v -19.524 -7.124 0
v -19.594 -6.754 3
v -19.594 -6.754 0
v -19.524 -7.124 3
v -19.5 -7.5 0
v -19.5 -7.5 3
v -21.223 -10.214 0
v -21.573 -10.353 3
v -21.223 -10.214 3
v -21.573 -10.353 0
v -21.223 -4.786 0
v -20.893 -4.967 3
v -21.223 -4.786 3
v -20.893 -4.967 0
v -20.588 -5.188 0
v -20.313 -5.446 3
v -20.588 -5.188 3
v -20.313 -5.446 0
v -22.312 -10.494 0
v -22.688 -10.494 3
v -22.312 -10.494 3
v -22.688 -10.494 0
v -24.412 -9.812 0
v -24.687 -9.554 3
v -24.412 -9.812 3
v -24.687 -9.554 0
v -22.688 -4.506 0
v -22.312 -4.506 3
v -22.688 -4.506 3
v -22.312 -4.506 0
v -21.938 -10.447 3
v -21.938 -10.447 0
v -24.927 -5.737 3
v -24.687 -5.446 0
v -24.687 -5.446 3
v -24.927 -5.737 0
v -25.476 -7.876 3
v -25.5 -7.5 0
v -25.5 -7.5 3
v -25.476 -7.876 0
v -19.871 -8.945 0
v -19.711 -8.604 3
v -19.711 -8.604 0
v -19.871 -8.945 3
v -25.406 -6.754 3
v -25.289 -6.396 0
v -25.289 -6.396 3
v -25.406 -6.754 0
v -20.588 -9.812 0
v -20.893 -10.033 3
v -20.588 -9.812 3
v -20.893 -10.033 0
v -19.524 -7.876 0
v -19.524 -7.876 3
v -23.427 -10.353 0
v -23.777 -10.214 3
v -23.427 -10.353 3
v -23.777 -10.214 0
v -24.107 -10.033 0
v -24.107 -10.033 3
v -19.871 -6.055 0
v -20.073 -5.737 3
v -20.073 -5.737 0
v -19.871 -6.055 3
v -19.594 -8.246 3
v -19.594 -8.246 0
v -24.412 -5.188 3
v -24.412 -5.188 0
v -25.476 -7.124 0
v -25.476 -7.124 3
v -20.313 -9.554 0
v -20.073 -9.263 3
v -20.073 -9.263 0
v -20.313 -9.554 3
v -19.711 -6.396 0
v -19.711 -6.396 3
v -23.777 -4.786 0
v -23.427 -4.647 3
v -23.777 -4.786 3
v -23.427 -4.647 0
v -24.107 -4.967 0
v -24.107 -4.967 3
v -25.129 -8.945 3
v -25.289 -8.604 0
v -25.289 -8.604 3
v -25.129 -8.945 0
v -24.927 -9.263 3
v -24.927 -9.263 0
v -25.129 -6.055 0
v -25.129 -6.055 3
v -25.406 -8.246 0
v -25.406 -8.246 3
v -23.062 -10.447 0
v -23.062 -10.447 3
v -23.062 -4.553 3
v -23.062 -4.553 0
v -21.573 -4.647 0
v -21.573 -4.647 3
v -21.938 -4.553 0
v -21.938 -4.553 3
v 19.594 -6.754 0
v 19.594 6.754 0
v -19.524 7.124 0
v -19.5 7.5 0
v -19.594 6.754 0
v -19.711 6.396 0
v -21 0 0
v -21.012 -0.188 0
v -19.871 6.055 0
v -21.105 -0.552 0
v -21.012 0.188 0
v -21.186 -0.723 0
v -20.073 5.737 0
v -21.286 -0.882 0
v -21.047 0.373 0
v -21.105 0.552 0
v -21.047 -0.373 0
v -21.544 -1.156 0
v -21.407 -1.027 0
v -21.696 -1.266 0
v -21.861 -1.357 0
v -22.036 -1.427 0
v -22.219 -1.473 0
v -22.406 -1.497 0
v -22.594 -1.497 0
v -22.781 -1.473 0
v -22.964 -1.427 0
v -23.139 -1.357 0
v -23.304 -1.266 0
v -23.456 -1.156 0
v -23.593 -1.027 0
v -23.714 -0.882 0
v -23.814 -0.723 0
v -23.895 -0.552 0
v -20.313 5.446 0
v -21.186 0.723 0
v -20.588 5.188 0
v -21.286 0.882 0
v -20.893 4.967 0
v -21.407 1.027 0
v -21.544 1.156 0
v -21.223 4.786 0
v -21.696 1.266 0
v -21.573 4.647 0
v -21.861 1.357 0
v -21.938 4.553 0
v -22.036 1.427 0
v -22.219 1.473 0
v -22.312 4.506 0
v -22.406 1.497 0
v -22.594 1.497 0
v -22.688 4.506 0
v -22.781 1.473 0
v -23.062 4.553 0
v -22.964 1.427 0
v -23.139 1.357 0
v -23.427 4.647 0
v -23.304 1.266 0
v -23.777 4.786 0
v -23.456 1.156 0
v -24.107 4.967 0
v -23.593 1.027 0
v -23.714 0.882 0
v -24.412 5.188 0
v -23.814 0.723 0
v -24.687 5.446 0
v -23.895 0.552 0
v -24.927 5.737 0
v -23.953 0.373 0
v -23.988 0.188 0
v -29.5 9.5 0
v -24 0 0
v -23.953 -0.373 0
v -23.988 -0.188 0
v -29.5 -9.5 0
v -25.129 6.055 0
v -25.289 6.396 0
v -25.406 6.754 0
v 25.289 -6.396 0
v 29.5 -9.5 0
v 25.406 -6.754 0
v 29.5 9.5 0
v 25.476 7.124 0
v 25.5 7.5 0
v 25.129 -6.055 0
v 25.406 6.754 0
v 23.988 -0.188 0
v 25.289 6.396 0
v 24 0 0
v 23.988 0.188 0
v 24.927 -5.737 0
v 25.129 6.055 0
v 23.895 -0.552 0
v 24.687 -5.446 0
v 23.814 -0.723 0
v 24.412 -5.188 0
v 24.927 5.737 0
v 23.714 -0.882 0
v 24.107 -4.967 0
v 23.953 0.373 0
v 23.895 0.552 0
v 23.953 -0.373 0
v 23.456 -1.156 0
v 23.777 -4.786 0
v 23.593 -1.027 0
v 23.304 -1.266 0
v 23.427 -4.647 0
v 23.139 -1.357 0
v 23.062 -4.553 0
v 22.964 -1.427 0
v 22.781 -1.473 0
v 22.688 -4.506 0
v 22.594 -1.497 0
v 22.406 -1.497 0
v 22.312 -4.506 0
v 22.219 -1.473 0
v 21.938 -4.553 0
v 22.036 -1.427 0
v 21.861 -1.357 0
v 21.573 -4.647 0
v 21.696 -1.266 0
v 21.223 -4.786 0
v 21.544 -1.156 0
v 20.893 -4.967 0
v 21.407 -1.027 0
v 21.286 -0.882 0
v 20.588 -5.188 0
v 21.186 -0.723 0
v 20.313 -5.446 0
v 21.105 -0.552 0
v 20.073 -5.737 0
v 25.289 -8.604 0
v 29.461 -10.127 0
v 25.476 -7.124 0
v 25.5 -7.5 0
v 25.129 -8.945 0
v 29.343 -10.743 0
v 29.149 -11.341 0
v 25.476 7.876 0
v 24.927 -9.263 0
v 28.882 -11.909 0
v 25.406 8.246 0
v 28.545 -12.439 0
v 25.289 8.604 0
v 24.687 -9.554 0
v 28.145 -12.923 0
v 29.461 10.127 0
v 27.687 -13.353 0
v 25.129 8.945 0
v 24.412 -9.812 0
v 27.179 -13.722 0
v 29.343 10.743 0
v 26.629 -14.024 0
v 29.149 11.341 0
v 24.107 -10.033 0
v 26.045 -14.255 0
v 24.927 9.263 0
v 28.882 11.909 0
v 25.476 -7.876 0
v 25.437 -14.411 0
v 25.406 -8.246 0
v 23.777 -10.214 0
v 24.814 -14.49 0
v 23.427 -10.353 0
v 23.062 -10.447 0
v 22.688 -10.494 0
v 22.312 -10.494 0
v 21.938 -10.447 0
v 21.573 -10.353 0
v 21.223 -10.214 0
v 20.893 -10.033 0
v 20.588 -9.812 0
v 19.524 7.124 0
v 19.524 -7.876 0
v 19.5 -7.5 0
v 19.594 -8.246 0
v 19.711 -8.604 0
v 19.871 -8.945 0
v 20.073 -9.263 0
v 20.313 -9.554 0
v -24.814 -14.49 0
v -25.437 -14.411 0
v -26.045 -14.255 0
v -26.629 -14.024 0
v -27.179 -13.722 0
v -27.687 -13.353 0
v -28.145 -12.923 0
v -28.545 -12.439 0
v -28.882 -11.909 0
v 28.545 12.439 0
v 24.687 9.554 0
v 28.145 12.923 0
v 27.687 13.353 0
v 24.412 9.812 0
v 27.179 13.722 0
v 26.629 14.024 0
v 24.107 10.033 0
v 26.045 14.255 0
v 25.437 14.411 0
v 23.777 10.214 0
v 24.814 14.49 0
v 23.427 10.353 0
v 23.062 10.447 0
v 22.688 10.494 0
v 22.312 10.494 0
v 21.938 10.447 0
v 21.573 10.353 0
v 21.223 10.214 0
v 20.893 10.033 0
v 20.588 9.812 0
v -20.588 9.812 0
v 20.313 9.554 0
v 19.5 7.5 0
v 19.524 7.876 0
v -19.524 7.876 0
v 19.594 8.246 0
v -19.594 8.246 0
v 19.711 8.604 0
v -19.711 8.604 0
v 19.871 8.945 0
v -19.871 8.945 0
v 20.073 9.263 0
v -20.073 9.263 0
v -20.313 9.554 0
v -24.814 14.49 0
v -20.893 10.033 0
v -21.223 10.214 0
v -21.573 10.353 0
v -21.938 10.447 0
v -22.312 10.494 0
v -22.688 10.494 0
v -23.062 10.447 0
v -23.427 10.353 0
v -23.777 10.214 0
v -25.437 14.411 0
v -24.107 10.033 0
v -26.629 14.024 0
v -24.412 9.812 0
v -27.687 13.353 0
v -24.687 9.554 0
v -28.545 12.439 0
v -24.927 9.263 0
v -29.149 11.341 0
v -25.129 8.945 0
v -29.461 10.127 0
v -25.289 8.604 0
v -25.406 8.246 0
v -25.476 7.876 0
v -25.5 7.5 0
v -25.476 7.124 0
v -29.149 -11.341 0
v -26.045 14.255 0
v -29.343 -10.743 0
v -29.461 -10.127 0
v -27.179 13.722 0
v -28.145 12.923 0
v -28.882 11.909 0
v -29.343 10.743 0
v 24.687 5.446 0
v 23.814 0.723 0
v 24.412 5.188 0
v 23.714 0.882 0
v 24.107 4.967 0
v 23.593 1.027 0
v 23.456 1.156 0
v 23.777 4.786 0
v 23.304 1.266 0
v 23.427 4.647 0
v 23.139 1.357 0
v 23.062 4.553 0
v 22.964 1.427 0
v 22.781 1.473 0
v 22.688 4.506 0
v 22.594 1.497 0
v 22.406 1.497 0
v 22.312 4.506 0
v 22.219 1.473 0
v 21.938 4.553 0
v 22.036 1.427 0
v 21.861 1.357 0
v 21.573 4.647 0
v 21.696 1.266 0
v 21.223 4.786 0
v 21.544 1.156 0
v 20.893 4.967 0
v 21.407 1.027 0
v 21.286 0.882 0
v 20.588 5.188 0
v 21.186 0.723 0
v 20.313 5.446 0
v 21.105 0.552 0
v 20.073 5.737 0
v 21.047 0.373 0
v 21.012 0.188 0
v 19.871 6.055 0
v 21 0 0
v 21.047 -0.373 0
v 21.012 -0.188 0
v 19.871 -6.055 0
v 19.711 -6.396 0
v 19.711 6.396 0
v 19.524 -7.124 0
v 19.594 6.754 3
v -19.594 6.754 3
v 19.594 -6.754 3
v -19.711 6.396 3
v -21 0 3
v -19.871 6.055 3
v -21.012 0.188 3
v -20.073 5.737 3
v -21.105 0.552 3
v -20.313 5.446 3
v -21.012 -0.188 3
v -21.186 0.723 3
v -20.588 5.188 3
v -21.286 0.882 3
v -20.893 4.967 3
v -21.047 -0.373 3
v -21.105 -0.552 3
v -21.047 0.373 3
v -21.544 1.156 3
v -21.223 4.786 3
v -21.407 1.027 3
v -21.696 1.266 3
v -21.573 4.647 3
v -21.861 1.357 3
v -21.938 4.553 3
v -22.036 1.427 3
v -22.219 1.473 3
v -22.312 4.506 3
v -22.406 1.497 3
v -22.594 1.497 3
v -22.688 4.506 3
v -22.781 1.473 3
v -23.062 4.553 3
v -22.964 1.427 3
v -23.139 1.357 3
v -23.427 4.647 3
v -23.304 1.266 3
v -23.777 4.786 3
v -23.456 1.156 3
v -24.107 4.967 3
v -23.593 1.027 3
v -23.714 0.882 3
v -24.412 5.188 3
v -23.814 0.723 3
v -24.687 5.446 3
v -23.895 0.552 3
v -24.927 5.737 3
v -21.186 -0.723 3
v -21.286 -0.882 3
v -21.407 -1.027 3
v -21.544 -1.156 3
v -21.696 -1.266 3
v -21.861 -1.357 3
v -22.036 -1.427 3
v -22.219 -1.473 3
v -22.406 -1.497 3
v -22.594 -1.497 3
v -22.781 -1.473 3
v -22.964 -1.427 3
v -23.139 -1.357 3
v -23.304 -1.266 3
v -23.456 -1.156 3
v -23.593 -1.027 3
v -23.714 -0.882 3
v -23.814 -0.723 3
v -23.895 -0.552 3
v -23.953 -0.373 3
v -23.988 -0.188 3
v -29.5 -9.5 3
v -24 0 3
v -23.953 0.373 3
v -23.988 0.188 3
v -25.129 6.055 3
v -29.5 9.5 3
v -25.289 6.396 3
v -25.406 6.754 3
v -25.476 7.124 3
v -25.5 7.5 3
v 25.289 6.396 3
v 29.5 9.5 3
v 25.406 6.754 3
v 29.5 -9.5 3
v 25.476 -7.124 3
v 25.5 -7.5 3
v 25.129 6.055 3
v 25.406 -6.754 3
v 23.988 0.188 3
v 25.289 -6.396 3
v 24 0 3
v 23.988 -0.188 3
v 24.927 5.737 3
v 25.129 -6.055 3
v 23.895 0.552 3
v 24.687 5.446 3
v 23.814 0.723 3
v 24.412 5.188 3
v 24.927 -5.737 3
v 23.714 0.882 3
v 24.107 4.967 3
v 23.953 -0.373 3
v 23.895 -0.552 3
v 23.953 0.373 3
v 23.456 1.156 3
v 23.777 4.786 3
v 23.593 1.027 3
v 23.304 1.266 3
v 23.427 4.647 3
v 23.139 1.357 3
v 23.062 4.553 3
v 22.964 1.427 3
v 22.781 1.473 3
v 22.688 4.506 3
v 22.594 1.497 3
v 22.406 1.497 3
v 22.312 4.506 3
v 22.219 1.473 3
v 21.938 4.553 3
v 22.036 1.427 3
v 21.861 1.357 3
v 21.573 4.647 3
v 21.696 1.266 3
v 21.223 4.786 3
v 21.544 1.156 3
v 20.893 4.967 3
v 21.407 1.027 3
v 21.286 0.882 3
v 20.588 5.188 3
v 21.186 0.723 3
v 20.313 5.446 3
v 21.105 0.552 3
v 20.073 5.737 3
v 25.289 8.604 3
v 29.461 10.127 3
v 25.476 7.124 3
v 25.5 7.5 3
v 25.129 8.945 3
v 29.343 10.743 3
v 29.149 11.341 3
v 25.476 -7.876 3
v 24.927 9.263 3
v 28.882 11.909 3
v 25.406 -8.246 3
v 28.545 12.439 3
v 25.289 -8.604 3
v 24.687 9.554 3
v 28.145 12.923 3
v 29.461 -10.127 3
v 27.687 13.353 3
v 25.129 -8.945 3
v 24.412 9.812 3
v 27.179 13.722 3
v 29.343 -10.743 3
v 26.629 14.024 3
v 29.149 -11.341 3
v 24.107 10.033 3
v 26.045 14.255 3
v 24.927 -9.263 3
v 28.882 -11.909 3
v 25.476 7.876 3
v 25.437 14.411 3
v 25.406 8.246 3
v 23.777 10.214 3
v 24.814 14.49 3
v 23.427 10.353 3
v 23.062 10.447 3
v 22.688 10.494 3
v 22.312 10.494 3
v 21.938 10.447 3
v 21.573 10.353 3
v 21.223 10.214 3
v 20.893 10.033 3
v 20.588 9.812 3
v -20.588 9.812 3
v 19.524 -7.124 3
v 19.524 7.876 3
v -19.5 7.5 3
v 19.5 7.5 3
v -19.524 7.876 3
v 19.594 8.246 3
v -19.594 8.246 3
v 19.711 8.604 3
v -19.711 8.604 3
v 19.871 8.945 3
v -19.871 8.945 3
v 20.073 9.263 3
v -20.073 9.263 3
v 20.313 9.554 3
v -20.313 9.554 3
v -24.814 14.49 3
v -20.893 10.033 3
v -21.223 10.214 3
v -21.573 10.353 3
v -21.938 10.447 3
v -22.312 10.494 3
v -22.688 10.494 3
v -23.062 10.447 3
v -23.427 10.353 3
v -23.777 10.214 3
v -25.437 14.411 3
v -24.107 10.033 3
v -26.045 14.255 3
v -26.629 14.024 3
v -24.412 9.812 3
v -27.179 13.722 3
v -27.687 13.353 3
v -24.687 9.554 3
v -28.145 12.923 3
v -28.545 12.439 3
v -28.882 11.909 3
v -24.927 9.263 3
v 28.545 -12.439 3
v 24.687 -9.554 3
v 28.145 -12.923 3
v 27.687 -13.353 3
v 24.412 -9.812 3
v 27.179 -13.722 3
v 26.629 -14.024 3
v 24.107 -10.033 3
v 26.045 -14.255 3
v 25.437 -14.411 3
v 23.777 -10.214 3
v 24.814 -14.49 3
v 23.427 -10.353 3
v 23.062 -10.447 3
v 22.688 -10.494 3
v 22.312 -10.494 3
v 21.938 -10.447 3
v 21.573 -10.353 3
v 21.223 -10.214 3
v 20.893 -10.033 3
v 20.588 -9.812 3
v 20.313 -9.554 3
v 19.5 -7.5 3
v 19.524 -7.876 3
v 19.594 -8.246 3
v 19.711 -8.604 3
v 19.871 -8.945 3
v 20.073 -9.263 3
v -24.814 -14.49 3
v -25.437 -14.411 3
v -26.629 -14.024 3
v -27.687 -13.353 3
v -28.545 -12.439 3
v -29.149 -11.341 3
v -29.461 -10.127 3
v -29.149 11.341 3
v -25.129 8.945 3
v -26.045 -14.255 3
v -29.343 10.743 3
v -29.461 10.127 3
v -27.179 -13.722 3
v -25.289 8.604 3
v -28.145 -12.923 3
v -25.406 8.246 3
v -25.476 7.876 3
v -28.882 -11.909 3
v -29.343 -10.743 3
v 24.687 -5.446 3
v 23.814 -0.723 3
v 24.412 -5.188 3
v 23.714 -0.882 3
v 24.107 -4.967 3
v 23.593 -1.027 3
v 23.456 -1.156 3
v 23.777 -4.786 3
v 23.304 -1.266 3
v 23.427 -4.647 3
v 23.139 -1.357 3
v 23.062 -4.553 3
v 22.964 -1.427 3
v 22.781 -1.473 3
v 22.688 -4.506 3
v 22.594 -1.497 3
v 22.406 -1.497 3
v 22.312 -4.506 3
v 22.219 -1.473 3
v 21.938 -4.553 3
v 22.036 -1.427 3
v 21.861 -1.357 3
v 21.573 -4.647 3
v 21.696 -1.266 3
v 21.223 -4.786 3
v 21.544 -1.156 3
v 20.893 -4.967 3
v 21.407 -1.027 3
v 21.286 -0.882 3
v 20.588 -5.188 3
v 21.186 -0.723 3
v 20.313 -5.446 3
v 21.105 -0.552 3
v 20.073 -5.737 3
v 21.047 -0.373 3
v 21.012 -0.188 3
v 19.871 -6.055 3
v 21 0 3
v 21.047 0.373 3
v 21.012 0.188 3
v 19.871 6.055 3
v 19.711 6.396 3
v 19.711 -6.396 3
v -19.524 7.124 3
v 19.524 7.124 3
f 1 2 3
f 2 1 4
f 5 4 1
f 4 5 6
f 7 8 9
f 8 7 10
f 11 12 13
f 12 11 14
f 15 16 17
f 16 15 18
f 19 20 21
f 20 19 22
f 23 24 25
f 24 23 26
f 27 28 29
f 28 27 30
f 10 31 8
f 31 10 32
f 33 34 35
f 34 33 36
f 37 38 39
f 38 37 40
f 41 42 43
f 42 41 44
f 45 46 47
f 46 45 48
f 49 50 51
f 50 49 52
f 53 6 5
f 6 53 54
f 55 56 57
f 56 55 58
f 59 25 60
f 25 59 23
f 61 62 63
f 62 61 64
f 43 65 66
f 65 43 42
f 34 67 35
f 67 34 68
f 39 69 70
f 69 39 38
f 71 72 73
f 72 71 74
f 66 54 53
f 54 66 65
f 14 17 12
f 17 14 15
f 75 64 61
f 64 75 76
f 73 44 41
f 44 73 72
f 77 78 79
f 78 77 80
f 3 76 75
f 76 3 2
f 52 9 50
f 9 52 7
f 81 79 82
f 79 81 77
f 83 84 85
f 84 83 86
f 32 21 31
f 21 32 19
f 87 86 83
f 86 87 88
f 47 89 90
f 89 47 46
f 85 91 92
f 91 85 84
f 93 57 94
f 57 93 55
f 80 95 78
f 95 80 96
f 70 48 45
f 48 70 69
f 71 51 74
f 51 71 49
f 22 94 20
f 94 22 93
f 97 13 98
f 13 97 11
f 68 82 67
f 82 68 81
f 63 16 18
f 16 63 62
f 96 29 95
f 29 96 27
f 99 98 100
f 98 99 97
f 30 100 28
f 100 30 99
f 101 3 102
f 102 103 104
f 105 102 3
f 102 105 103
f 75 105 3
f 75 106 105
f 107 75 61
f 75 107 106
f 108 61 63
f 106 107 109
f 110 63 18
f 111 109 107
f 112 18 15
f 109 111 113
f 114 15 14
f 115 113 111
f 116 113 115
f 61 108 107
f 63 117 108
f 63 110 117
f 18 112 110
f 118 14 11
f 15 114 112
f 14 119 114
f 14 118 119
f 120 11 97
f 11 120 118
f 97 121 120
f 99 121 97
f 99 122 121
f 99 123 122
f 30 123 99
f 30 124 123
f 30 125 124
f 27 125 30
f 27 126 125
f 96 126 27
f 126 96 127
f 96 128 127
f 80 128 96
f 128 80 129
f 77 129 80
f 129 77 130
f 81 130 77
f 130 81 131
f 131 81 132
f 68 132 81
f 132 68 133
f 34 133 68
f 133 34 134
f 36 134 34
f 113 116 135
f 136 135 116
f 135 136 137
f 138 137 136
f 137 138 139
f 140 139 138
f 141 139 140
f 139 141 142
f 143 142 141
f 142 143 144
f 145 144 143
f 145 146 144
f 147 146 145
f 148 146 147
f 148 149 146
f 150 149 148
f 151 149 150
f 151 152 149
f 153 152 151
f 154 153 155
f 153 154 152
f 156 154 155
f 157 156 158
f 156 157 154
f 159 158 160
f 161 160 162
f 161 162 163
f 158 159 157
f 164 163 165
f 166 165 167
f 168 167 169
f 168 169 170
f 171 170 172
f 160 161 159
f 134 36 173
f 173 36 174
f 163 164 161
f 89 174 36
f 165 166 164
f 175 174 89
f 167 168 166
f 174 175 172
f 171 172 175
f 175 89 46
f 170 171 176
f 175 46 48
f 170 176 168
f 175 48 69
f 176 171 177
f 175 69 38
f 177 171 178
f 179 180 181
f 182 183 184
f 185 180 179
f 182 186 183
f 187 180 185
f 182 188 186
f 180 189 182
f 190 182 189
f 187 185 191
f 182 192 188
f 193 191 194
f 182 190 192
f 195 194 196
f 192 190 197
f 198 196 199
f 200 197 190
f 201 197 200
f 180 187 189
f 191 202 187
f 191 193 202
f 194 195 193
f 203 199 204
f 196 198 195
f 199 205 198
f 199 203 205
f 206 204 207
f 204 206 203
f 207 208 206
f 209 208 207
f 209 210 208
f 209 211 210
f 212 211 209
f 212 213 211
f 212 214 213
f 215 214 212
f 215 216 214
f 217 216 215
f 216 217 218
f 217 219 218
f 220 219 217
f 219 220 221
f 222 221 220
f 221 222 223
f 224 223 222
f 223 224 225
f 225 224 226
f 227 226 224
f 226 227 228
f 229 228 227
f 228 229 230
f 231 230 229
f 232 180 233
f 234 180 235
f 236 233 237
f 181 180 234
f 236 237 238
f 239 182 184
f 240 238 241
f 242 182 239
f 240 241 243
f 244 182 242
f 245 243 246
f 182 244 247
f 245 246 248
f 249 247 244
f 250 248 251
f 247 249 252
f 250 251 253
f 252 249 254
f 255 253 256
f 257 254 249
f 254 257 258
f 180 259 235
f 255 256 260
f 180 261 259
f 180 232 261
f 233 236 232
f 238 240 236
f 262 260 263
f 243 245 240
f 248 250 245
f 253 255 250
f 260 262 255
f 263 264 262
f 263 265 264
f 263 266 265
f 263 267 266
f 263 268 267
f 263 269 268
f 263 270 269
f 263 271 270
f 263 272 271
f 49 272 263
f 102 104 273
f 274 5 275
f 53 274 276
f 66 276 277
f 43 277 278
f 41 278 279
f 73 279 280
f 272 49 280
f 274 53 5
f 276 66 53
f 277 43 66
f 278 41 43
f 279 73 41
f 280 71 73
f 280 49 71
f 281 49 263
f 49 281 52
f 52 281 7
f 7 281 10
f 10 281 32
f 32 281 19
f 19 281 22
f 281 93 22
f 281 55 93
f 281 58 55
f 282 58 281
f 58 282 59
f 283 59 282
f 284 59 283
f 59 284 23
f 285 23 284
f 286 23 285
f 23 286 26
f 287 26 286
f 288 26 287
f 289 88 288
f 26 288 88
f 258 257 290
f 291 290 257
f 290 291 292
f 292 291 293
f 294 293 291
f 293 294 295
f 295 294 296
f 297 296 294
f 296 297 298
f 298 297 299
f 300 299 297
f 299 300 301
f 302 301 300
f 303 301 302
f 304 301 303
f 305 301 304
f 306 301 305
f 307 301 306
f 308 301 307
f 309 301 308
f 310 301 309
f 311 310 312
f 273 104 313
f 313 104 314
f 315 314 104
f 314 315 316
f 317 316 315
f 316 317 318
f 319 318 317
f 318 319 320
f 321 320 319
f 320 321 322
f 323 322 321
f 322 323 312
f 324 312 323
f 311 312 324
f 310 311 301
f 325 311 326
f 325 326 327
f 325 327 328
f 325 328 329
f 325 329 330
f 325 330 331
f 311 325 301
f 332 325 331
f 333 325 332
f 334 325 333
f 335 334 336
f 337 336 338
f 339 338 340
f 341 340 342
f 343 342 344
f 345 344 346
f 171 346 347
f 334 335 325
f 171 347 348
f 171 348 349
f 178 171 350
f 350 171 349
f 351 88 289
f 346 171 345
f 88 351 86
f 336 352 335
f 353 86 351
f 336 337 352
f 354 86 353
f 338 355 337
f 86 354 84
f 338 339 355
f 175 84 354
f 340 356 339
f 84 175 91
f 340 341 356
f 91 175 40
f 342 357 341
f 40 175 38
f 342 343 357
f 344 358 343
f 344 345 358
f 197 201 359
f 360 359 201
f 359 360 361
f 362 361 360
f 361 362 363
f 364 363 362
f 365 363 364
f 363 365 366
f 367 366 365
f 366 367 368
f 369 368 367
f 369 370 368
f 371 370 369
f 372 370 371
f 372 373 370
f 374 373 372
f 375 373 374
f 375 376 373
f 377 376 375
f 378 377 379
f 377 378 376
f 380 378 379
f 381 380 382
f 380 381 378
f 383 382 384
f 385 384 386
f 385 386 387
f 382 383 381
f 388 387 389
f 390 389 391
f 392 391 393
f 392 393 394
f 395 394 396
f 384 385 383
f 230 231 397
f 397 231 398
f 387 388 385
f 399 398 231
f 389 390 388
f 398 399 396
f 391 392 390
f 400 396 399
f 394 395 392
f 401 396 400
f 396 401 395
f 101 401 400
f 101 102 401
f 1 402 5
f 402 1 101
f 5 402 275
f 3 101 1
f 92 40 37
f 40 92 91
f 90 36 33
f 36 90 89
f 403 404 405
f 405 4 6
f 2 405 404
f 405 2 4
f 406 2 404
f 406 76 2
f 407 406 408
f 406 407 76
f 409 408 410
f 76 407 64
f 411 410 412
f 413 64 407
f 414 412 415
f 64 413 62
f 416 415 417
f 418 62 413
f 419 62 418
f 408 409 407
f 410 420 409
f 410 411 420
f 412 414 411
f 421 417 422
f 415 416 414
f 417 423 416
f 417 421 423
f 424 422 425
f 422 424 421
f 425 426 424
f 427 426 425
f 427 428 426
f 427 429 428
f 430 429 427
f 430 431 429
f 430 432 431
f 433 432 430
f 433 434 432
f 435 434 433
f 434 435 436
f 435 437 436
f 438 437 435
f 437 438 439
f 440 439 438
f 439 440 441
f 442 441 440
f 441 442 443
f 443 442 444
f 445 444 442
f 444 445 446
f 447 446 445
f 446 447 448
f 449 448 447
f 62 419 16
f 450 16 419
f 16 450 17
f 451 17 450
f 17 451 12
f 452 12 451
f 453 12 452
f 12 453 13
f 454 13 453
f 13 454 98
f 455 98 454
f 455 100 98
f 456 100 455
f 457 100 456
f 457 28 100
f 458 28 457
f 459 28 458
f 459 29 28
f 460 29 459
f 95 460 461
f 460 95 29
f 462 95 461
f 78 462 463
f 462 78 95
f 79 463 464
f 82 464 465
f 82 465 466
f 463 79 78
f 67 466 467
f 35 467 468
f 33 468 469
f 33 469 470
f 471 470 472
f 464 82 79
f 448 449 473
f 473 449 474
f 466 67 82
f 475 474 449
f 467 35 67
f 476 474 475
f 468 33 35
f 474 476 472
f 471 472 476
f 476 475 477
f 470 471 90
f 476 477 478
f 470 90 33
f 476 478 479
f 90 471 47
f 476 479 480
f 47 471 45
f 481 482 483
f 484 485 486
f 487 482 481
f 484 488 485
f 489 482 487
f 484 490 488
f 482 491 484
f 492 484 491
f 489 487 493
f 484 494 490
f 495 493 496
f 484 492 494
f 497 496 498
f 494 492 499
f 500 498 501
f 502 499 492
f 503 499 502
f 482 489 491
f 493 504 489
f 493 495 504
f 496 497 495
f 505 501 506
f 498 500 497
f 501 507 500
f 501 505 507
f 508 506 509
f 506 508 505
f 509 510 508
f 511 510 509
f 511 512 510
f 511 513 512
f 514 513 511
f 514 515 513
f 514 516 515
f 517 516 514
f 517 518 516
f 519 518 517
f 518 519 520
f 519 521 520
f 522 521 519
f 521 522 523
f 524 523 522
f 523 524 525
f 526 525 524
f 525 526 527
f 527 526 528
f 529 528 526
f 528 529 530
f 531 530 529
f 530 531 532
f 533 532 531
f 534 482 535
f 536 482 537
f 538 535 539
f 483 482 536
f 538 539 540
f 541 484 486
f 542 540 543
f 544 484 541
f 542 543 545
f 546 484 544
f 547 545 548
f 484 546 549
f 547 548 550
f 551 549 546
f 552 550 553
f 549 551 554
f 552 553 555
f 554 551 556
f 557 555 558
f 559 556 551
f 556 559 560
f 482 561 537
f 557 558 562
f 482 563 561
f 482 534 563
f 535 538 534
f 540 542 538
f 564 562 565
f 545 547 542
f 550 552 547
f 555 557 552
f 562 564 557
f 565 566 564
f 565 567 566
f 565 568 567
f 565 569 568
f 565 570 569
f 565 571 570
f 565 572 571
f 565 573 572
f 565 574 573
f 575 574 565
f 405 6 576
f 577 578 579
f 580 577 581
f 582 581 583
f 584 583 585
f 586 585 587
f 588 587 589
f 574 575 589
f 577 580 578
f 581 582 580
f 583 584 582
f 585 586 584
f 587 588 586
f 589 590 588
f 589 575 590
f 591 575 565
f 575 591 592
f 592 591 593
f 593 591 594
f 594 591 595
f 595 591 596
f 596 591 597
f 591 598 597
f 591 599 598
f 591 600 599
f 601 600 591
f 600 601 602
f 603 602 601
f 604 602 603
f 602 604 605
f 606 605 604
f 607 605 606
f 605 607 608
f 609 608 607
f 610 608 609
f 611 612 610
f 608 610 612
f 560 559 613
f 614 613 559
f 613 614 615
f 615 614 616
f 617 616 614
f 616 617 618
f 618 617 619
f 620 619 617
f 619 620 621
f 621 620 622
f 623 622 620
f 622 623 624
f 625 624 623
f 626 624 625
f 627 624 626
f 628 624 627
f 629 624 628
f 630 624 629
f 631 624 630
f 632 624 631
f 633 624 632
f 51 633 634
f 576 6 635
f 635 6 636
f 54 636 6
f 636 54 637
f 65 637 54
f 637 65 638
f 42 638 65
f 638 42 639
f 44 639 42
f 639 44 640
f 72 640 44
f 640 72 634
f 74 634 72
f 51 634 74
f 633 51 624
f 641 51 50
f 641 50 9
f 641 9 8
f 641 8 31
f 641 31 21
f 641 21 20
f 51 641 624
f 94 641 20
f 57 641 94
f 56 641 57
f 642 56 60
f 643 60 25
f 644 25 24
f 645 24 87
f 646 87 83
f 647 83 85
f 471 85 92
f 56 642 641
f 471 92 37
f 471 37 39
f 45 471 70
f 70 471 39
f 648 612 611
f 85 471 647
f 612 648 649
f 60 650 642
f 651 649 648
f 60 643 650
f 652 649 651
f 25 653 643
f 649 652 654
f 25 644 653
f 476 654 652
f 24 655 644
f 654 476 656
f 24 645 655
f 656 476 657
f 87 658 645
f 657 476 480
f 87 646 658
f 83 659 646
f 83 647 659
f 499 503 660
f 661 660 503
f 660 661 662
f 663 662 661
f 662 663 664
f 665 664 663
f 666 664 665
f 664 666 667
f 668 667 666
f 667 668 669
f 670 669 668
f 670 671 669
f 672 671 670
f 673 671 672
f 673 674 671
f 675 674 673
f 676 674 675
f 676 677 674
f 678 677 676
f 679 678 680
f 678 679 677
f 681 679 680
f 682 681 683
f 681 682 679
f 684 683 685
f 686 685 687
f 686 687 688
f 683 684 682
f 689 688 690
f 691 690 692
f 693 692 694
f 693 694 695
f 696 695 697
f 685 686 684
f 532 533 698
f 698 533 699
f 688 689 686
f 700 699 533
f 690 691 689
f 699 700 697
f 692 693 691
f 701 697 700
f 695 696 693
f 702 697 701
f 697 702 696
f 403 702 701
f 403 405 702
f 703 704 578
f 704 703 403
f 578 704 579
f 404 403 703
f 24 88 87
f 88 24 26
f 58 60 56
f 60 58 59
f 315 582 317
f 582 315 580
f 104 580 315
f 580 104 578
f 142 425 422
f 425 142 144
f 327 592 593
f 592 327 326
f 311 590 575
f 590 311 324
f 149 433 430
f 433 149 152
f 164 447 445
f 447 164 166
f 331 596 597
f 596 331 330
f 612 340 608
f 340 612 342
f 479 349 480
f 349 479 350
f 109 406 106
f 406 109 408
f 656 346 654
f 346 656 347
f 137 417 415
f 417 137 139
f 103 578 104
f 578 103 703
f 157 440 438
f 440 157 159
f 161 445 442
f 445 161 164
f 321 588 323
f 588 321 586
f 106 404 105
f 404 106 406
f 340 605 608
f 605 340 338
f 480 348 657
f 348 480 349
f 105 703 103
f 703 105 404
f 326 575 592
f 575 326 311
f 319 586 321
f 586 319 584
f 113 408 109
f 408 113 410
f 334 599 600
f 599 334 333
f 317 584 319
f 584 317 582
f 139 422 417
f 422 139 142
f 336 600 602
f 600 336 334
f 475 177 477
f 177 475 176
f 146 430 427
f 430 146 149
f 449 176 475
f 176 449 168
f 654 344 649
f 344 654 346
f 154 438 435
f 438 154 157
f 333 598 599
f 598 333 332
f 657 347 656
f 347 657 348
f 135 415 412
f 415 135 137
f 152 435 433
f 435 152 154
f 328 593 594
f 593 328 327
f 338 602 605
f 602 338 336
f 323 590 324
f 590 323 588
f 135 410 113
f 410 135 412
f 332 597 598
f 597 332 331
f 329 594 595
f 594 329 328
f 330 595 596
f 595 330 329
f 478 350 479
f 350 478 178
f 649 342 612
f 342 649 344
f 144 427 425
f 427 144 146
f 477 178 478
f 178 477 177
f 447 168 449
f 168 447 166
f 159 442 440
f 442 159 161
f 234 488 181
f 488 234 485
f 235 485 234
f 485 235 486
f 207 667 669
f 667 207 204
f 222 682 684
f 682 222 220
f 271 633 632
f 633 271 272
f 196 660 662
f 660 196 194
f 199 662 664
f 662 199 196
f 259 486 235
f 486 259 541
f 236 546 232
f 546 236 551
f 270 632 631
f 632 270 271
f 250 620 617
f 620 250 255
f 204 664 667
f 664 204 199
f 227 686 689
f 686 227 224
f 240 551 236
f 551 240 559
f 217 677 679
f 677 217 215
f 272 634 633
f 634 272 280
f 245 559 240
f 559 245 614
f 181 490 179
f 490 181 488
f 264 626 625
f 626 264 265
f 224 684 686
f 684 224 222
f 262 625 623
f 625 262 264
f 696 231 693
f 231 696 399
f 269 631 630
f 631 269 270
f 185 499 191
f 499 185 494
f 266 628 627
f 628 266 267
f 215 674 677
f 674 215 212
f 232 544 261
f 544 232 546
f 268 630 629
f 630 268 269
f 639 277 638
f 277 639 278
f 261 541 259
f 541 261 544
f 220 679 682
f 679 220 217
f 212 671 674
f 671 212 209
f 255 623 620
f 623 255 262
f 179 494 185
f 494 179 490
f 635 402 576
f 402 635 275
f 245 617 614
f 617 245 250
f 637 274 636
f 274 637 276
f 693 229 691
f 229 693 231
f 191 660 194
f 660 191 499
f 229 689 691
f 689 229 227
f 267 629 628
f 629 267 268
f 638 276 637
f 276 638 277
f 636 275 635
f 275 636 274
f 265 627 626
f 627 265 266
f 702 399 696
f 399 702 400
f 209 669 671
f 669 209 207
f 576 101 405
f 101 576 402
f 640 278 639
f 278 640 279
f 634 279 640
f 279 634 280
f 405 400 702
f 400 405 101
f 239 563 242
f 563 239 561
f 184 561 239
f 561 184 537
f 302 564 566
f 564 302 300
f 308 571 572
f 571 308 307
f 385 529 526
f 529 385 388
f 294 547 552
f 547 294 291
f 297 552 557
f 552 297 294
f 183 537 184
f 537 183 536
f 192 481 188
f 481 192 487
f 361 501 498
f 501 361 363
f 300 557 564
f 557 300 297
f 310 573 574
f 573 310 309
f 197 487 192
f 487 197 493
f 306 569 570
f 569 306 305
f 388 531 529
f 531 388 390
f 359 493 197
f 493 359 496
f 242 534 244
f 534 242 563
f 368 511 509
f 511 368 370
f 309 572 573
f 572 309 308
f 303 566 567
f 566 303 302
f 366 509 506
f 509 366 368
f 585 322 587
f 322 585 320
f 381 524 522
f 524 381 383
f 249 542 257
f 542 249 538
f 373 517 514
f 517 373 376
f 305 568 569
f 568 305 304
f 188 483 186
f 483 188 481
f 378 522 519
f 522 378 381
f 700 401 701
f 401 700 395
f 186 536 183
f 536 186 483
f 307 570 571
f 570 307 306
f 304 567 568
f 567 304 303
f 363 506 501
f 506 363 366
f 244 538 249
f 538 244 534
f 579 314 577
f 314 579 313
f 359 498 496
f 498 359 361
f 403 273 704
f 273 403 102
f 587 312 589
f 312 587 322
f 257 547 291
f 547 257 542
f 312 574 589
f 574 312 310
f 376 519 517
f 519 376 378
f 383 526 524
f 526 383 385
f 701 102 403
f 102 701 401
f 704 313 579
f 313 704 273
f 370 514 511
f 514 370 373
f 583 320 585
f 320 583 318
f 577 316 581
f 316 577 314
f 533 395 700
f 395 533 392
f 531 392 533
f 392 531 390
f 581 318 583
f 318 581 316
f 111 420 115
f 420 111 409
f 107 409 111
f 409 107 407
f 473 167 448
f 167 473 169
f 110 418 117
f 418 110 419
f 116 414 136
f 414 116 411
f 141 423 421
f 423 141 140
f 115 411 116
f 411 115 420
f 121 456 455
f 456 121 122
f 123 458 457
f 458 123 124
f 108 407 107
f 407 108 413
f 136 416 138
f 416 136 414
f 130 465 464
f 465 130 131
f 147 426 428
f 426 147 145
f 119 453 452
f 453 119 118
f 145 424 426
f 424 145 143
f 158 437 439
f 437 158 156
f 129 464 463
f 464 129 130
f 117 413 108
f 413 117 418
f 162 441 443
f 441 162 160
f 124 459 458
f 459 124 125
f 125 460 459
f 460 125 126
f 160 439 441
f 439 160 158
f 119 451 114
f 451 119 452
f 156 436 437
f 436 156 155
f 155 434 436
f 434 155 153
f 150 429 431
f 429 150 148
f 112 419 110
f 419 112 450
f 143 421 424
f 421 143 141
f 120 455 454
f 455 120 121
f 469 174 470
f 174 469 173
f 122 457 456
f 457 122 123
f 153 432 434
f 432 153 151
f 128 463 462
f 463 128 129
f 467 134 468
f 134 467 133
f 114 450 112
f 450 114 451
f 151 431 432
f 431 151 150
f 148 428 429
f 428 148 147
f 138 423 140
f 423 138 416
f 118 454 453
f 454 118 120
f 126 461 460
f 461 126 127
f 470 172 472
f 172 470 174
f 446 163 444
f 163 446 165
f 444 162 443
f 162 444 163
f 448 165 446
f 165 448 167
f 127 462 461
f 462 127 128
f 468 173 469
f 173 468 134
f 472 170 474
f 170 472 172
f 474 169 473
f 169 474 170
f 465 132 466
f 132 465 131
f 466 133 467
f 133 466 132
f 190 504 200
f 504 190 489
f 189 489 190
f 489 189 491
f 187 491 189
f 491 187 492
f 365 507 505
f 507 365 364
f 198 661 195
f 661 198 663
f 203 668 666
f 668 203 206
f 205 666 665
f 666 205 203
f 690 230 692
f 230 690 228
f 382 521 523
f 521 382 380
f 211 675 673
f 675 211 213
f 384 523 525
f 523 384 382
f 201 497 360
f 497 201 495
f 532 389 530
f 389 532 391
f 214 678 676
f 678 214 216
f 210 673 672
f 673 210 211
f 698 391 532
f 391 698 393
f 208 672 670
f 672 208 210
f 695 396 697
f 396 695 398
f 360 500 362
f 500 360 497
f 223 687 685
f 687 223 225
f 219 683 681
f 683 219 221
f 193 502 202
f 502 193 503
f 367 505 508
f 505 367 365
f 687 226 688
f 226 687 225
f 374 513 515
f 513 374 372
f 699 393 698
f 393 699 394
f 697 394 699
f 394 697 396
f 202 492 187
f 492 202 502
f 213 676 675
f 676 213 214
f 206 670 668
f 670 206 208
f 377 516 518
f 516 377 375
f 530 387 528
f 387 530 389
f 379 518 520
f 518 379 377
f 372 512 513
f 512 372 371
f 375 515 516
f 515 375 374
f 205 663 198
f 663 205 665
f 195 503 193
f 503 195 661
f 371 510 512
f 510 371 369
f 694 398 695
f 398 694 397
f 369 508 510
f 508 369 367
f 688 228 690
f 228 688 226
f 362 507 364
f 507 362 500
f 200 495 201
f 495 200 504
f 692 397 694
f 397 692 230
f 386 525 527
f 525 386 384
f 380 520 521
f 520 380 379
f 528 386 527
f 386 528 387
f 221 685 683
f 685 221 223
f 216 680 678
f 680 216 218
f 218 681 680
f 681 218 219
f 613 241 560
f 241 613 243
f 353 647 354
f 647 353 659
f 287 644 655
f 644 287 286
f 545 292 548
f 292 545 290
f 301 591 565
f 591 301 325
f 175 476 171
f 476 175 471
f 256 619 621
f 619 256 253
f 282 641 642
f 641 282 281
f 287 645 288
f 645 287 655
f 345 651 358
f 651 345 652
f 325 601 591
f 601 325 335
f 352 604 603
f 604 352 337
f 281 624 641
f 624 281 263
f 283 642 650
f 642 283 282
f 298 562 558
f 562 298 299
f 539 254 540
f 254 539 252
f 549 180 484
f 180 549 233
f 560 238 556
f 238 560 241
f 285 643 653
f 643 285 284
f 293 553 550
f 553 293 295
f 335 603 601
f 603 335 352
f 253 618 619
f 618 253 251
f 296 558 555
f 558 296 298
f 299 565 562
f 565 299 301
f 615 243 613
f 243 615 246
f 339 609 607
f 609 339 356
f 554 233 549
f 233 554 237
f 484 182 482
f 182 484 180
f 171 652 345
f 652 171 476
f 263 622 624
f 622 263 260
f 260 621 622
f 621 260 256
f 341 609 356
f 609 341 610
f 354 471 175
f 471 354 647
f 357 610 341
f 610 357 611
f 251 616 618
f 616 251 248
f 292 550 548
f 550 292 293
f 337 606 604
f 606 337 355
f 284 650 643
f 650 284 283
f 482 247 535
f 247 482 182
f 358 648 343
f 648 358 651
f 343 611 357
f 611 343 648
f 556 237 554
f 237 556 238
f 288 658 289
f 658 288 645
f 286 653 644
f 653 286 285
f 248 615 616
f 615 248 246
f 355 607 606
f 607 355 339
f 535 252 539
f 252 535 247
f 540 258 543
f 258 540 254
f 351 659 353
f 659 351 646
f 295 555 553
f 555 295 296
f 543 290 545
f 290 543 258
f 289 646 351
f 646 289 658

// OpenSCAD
$fn = 50;


difference() {
	union() {
		hull() {
			translate(v = [-24.5000000000, 9.5000000000, 0]) {
				cylinder(h = 3, r = 5);
			}
			translate(v = [24.5000000000, 9.5000000000, 0]) {
				cylinder(h = 3, r = 5);
			}
			translate(v = [-24.5000000000, -9.5000000000, 0]) {
				cylinder(h = 3, r = 5);
			}
			translate(v = [24.5000000000, -9.5000000000, 0]) {
				cylinder(h = 3, r = 5);
			}
		}
	}
	union() {
		translate(v = [-22.5000000000, -7.5000000000, 0]) {
			cylinder(h = 3, r = 3.0000000000);
		}
		translate(v = [-22.5000000000, 7.5000000000, 0]) {
			cylinder(h = 3, r = 3.0000000000);
		}
		translate(v = [22.5000000000, -7.5000000000, 0]) {
			cylinder(h = 3, r = 3.0000000000);
		}
		translate(v = [22.5000000000, 7.5000000000, 0]) {
			cylinder(h = 3, r = 3.0000000000);
		}
		translate(v = [-22.5000000000, -7.5000000000, 0]) {
			cylinder(h = 3, r = 1.5000000000);
		}
		translate(v = [-22.5000000000, 0.0000000000, 0]) {
			cylinder(h = 3, r = 1.5000000000);
		}
		translate(v = [-22.5000000000, 7.5000000000, 0]) {
			cylinder(h = 3, r = 1.5000000000);
		}
		translate(v = [22.5000000000, -7.5000000000, 0]) {
			cylinder(h = 3, r = 1.5000000000);
		}
		translate(v = [22.5000000000, 0.0000000000, 0]) {
			cylinder(h = 3, r = 1.5000000000);
		}
		translate(v = [22.5000000000, 7.5000000000, 0]) {
			cylinder(h = 3, r = 1.5000000000);
		}
		translate(v = [-22.5000000000, -7.5000000000, 0]) {
			cylinder(h = 3, r = 1.5000000000);
		}
		translate(v = [-22.5000000000, 0.0000000000, 0]) {
			cylinder(h = 3, r = 1.5000000000);
		}
		translate(v = [-22.5000000000, 7.5000000000, 0]) {
			cylinder(h = 3, r = 1.5000000000);
		}
		translate(v = [22.5000000000, -7.5000000000, 0]) {
			cylinder(h = 3, r = 1.5000000000);
		}
		translate(v = [22.5000000000, 0.0000000000, 0]) {
			cylinder(h = 3, r = 1.5000000000);
		}
		translate(v = [22.5000000000, 7.5000000000, 0]) {
			cylinder(h = 3, r = 1.5000000000);
		}
		translate(v = [-22.5000000000, -7.5000000000, 0]) {
			cylinder(h = 3, r = 1.5000000000);
		}
		translate(v = [-22.5000000000, 0.0000000000, 0]) {
			cylinder(h = 3, r = 1.5000000000);
		}
		translate(v = [-22.5000000000, 7.5000000000, 0]) {
			cylinder(h = 3, r = 1.5000000000);
		}
		translate(v = [22.5000000000, -7.5000000000, 0]) {
			cylinder(h = 3, r = 1.5000000000);
		}
		translate(v = [22.5000000000, 0.0000000000, 0]) {
			cylinder(h = 3, r = 1.5000000000);
		}
		translate(v = [22.5000000000, 7.5000000000, 0]) {
			cylinder(h = 3, r = 1.5000000000);
		}
	}
}
